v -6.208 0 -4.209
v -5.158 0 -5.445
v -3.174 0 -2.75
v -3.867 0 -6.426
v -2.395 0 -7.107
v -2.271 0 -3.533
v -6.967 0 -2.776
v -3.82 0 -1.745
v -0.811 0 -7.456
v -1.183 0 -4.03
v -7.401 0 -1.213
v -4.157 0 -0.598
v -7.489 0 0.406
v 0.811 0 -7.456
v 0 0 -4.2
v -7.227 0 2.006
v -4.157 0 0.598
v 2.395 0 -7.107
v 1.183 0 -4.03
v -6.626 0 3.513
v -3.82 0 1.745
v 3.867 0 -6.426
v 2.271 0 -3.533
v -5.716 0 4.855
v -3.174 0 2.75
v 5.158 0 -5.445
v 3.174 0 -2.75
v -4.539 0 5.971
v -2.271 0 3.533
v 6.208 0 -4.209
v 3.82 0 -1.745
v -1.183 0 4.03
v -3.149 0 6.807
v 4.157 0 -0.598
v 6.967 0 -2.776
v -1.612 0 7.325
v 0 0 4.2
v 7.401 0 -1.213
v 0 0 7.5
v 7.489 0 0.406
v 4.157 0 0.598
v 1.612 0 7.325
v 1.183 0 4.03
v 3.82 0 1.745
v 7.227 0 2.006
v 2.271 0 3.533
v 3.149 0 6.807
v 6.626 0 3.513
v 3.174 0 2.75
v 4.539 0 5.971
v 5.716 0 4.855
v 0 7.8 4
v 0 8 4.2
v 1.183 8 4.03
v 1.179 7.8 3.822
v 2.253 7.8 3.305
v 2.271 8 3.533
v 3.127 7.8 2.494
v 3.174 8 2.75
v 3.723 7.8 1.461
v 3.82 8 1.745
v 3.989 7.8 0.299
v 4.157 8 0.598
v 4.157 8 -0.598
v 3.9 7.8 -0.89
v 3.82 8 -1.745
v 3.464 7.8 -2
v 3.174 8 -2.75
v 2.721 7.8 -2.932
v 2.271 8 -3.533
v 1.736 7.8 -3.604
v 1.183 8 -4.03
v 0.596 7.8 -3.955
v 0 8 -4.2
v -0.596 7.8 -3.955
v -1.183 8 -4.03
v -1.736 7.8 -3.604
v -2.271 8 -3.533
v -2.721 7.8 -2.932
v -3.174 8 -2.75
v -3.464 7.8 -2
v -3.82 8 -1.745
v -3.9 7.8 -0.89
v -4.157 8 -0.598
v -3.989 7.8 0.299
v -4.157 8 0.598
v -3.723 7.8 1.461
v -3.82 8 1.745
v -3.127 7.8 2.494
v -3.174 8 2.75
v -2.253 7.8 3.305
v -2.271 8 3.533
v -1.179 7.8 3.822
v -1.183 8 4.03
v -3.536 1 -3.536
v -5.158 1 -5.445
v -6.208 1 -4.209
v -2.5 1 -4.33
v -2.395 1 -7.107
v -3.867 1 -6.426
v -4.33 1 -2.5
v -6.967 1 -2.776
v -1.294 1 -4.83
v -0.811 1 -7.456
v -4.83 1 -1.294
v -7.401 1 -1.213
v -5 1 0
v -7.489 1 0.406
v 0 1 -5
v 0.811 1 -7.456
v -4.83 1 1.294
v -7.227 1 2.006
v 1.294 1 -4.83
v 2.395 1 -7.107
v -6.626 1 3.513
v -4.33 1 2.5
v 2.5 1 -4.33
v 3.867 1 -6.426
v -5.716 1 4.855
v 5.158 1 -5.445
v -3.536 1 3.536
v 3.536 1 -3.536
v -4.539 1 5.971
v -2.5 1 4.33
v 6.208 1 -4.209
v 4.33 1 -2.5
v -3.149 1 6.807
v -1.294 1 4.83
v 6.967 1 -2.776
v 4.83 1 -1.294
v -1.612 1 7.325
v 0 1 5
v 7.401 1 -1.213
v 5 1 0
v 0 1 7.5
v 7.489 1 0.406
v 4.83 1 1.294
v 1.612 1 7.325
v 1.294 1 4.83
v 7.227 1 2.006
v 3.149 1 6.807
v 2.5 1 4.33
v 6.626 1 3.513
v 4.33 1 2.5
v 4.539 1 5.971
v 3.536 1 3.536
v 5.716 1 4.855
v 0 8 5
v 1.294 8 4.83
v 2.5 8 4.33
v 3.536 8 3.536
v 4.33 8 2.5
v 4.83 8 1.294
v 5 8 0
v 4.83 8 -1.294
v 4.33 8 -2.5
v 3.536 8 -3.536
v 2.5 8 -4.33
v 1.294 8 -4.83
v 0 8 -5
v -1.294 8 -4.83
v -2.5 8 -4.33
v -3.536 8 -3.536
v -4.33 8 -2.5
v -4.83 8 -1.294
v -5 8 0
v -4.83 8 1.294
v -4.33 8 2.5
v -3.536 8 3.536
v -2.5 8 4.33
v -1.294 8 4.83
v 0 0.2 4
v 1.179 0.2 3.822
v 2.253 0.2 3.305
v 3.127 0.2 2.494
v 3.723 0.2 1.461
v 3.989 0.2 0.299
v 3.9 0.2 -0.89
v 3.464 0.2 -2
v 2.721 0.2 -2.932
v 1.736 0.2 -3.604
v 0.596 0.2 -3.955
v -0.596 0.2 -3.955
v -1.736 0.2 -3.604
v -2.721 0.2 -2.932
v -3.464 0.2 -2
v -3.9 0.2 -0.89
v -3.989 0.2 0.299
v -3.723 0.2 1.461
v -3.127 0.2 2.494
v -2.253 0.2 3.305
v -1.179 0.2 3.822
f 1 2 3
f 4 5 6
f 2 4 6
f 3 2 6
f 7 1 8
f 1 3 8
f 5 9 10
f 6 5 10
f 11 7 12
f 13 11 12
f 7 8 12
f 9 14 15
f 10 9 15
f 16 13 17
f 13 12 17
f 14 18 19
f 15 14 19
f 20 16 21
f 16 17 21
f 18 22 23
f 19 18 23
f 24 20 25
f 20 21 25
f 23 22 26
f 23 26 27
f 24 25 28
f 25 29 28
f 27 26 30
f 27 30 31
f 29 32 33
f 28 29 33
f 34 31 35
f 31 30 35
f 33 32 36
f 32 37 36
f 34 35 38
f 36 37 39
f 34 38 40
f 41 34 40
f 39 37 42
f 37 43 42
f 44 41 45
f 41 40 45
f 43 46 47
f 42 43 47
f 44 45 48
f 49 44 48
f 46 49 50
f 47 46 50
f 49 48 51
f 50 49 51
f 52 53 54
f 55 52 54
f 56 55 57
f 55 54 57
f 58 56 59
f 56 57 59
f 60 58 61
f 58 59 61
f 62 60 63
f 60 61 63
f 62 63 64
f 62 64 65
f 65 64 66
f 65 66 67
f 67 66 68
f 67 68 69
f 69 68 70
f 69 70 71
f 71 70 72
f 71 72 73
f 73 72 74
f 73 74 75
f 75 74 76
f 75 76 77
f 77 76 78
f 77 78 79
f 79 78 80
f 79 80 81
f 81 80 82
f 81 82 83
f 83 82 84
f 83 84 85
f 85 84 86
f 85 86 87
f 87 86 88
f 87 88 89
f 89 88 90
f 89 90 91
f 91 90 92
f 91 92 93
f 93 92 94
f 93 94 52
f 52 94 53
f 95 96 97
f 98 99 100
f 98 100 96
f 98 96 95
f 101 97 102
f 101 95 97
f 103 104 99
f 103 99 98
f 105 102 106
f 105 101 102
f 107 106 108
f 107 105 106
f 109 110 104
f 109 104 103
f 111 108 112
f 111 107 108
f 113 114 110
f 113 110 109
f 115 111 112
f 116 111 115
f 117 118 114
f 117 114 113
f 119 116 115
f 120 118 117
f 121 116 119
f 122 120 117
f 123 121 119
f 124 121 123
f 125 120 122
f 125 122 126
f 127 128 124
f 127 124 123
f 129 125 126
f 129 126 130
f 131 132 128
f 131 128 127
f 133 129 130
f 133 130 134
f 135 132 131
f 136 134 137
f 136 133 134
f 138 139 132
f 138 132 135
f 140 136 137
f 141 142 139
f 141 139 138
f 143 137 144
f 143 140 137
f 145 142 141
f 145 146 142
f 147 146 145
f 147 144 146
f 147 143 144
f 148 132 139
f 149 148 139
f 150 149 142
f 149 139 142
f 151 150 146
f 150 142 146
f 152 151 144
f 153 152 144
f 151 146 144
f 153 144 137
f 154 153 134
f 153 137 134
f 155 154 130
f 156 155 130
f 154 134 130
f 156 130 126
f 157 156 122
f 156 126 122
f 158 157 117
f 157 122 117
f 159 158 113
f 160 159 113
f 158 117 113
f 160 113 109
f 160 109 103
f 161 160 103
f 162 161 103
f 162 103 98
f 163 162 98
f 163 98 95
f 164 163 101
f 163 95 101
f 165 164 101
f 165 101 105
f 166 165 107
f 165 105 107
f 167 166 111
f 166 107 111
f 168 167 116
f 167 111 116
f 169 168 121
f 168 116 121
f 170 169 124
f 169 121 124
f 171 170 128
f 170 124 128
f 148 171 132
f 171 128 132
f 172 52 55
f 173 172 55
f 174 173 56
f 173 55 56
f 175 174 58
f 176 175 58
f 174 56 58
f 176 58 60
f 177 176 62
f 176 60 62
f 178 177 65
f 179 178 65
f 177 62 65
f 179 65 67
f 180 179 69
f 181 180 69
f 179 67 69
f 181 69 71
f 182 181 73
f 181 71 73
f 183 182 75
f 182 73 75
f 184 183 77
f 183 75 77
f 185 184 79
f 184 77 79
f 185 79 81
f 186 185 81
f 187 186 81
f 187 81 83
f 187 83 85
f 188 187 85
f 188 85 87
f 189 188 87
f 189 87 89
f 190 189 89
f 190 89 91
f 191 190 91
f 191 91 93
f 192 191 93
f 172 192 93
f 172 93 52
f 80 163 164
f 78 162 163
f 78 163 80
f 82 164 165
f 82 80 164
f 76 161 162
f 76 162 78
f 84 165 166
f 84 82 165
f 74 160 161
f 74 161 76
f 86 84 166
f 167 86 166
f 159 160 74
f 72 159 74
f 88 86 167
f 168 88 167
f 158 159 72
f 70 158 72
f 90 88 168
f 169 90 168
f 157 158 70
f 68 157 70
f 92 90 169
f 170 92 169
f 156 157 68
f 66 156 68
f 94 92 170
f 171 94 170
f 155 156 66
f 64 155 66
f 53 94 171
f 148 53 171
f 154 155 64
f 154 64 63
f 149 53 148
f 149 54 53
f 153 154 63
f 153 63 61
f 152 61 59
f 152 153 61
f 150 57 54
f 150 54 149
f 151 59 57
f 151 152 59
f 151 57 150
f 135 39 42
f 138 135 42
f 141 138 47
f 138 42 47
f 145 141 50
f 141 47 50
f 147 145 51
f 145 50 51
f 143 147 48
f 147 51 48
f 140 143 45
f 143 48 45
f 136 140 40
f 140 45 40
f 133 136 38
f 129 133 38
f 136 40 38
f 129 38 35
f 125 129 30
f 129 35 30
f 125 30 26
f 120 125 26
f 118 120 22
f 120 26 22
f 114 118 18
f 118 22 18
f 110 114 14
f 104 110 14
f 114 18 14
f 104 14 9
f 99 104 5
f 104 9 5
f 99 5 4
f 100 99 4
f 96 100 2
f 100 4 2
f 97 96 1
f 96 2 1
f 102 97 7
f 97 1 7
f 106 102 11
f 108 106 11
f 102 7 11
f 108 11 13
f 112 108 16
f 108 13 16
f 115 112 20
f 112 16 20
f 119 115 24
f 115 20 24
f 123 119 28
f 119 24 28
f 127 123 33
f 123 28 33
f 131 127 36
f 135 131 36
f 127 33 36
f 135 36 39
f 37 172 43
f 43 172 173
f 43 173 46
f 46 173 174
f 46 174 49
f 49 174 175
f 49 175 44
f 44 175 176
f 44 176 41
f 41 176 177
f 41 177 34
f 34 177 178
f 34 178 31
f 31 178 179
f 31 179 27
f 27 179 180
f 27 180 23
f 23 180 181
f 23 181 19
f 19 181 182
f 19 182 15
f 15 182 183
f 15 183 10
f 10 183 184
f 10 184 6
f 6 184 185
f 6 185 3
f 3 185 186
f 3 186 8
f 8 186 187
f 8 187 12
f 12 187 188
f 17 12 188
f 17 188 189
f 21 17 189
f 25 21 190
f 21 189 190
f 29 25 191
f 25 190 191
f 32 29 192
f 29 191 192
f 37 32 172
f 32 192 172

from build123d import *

# Parameters (mm, degrees)
SKIZZE1_R                       = 7.5
AUFSATZ_LINEAR_AUSTRAGEN1_DEPTH = 1
SKIZZE2_R                       = 5
AUFSATZ_LINEAR_AUSTRAGEN2_DEPTH = 7
SKIZZE4_R                       = 4
SCHNITT_LINEAR_AUSTRAGEN1_DEPTH = 14.285330256
FASE1_SIZE                      = 0.2


with BuildPart() as part:
    # Skizze1 → Aufsatz-Linear austragen1 (new body)
    with BuildSketch(Plane(origin=(0, 0, 0), x_dir=(1, 0, 0), z_dir=(0, 1, 0))):
        with Locations(Location((0, 0, 0), (0, 0, 270))):
            Circle(SKIZZE1_R)
    extrude(amount=AUFSATZ_LINEAR_AUSTRAGEN1_DEPTH)

    # Skizze2 → Aufsatz-Linear austragen2 (add)
    with BuildSketch(Plane(origin=(0, 1, 0), x_dir=(1, 0, 0), z_dir=(0, 1, 0))):
        with Locations(Location((0, 0, 0), (0, 0, 270))):
            Circle(SKIZZE2_R)
    extrude(amount=AUFSATZ_LINEAR_AUSTRAGEN2_DEPTH)

    # Skizze4 → Schnitt-Linear austragen1 (cut, through all)
    with BuildSketch(Plane(origin=(0, 8, 0), x_dir=(1, 0, 0), z_dir=(0, 1, 0))):
        with Locations(Location((0, 0, 0), (0, 0, 270))):
            Circle(SKIZZE4_R)
    extrude(amount=-SCHNITT_LINEAR_AUSTRAGEN1_DEPTH, mode=Mode.SUBTRACT)

    # Fase1
    fase1_edges = [part.edges().sort_by_distance(p)[0] for p in [
        (0, 0, -4),
        (0, 8, -4),
    ]]
    chamfer(fase1_edges, length=FASE1_SIZE)


solid = part.part
